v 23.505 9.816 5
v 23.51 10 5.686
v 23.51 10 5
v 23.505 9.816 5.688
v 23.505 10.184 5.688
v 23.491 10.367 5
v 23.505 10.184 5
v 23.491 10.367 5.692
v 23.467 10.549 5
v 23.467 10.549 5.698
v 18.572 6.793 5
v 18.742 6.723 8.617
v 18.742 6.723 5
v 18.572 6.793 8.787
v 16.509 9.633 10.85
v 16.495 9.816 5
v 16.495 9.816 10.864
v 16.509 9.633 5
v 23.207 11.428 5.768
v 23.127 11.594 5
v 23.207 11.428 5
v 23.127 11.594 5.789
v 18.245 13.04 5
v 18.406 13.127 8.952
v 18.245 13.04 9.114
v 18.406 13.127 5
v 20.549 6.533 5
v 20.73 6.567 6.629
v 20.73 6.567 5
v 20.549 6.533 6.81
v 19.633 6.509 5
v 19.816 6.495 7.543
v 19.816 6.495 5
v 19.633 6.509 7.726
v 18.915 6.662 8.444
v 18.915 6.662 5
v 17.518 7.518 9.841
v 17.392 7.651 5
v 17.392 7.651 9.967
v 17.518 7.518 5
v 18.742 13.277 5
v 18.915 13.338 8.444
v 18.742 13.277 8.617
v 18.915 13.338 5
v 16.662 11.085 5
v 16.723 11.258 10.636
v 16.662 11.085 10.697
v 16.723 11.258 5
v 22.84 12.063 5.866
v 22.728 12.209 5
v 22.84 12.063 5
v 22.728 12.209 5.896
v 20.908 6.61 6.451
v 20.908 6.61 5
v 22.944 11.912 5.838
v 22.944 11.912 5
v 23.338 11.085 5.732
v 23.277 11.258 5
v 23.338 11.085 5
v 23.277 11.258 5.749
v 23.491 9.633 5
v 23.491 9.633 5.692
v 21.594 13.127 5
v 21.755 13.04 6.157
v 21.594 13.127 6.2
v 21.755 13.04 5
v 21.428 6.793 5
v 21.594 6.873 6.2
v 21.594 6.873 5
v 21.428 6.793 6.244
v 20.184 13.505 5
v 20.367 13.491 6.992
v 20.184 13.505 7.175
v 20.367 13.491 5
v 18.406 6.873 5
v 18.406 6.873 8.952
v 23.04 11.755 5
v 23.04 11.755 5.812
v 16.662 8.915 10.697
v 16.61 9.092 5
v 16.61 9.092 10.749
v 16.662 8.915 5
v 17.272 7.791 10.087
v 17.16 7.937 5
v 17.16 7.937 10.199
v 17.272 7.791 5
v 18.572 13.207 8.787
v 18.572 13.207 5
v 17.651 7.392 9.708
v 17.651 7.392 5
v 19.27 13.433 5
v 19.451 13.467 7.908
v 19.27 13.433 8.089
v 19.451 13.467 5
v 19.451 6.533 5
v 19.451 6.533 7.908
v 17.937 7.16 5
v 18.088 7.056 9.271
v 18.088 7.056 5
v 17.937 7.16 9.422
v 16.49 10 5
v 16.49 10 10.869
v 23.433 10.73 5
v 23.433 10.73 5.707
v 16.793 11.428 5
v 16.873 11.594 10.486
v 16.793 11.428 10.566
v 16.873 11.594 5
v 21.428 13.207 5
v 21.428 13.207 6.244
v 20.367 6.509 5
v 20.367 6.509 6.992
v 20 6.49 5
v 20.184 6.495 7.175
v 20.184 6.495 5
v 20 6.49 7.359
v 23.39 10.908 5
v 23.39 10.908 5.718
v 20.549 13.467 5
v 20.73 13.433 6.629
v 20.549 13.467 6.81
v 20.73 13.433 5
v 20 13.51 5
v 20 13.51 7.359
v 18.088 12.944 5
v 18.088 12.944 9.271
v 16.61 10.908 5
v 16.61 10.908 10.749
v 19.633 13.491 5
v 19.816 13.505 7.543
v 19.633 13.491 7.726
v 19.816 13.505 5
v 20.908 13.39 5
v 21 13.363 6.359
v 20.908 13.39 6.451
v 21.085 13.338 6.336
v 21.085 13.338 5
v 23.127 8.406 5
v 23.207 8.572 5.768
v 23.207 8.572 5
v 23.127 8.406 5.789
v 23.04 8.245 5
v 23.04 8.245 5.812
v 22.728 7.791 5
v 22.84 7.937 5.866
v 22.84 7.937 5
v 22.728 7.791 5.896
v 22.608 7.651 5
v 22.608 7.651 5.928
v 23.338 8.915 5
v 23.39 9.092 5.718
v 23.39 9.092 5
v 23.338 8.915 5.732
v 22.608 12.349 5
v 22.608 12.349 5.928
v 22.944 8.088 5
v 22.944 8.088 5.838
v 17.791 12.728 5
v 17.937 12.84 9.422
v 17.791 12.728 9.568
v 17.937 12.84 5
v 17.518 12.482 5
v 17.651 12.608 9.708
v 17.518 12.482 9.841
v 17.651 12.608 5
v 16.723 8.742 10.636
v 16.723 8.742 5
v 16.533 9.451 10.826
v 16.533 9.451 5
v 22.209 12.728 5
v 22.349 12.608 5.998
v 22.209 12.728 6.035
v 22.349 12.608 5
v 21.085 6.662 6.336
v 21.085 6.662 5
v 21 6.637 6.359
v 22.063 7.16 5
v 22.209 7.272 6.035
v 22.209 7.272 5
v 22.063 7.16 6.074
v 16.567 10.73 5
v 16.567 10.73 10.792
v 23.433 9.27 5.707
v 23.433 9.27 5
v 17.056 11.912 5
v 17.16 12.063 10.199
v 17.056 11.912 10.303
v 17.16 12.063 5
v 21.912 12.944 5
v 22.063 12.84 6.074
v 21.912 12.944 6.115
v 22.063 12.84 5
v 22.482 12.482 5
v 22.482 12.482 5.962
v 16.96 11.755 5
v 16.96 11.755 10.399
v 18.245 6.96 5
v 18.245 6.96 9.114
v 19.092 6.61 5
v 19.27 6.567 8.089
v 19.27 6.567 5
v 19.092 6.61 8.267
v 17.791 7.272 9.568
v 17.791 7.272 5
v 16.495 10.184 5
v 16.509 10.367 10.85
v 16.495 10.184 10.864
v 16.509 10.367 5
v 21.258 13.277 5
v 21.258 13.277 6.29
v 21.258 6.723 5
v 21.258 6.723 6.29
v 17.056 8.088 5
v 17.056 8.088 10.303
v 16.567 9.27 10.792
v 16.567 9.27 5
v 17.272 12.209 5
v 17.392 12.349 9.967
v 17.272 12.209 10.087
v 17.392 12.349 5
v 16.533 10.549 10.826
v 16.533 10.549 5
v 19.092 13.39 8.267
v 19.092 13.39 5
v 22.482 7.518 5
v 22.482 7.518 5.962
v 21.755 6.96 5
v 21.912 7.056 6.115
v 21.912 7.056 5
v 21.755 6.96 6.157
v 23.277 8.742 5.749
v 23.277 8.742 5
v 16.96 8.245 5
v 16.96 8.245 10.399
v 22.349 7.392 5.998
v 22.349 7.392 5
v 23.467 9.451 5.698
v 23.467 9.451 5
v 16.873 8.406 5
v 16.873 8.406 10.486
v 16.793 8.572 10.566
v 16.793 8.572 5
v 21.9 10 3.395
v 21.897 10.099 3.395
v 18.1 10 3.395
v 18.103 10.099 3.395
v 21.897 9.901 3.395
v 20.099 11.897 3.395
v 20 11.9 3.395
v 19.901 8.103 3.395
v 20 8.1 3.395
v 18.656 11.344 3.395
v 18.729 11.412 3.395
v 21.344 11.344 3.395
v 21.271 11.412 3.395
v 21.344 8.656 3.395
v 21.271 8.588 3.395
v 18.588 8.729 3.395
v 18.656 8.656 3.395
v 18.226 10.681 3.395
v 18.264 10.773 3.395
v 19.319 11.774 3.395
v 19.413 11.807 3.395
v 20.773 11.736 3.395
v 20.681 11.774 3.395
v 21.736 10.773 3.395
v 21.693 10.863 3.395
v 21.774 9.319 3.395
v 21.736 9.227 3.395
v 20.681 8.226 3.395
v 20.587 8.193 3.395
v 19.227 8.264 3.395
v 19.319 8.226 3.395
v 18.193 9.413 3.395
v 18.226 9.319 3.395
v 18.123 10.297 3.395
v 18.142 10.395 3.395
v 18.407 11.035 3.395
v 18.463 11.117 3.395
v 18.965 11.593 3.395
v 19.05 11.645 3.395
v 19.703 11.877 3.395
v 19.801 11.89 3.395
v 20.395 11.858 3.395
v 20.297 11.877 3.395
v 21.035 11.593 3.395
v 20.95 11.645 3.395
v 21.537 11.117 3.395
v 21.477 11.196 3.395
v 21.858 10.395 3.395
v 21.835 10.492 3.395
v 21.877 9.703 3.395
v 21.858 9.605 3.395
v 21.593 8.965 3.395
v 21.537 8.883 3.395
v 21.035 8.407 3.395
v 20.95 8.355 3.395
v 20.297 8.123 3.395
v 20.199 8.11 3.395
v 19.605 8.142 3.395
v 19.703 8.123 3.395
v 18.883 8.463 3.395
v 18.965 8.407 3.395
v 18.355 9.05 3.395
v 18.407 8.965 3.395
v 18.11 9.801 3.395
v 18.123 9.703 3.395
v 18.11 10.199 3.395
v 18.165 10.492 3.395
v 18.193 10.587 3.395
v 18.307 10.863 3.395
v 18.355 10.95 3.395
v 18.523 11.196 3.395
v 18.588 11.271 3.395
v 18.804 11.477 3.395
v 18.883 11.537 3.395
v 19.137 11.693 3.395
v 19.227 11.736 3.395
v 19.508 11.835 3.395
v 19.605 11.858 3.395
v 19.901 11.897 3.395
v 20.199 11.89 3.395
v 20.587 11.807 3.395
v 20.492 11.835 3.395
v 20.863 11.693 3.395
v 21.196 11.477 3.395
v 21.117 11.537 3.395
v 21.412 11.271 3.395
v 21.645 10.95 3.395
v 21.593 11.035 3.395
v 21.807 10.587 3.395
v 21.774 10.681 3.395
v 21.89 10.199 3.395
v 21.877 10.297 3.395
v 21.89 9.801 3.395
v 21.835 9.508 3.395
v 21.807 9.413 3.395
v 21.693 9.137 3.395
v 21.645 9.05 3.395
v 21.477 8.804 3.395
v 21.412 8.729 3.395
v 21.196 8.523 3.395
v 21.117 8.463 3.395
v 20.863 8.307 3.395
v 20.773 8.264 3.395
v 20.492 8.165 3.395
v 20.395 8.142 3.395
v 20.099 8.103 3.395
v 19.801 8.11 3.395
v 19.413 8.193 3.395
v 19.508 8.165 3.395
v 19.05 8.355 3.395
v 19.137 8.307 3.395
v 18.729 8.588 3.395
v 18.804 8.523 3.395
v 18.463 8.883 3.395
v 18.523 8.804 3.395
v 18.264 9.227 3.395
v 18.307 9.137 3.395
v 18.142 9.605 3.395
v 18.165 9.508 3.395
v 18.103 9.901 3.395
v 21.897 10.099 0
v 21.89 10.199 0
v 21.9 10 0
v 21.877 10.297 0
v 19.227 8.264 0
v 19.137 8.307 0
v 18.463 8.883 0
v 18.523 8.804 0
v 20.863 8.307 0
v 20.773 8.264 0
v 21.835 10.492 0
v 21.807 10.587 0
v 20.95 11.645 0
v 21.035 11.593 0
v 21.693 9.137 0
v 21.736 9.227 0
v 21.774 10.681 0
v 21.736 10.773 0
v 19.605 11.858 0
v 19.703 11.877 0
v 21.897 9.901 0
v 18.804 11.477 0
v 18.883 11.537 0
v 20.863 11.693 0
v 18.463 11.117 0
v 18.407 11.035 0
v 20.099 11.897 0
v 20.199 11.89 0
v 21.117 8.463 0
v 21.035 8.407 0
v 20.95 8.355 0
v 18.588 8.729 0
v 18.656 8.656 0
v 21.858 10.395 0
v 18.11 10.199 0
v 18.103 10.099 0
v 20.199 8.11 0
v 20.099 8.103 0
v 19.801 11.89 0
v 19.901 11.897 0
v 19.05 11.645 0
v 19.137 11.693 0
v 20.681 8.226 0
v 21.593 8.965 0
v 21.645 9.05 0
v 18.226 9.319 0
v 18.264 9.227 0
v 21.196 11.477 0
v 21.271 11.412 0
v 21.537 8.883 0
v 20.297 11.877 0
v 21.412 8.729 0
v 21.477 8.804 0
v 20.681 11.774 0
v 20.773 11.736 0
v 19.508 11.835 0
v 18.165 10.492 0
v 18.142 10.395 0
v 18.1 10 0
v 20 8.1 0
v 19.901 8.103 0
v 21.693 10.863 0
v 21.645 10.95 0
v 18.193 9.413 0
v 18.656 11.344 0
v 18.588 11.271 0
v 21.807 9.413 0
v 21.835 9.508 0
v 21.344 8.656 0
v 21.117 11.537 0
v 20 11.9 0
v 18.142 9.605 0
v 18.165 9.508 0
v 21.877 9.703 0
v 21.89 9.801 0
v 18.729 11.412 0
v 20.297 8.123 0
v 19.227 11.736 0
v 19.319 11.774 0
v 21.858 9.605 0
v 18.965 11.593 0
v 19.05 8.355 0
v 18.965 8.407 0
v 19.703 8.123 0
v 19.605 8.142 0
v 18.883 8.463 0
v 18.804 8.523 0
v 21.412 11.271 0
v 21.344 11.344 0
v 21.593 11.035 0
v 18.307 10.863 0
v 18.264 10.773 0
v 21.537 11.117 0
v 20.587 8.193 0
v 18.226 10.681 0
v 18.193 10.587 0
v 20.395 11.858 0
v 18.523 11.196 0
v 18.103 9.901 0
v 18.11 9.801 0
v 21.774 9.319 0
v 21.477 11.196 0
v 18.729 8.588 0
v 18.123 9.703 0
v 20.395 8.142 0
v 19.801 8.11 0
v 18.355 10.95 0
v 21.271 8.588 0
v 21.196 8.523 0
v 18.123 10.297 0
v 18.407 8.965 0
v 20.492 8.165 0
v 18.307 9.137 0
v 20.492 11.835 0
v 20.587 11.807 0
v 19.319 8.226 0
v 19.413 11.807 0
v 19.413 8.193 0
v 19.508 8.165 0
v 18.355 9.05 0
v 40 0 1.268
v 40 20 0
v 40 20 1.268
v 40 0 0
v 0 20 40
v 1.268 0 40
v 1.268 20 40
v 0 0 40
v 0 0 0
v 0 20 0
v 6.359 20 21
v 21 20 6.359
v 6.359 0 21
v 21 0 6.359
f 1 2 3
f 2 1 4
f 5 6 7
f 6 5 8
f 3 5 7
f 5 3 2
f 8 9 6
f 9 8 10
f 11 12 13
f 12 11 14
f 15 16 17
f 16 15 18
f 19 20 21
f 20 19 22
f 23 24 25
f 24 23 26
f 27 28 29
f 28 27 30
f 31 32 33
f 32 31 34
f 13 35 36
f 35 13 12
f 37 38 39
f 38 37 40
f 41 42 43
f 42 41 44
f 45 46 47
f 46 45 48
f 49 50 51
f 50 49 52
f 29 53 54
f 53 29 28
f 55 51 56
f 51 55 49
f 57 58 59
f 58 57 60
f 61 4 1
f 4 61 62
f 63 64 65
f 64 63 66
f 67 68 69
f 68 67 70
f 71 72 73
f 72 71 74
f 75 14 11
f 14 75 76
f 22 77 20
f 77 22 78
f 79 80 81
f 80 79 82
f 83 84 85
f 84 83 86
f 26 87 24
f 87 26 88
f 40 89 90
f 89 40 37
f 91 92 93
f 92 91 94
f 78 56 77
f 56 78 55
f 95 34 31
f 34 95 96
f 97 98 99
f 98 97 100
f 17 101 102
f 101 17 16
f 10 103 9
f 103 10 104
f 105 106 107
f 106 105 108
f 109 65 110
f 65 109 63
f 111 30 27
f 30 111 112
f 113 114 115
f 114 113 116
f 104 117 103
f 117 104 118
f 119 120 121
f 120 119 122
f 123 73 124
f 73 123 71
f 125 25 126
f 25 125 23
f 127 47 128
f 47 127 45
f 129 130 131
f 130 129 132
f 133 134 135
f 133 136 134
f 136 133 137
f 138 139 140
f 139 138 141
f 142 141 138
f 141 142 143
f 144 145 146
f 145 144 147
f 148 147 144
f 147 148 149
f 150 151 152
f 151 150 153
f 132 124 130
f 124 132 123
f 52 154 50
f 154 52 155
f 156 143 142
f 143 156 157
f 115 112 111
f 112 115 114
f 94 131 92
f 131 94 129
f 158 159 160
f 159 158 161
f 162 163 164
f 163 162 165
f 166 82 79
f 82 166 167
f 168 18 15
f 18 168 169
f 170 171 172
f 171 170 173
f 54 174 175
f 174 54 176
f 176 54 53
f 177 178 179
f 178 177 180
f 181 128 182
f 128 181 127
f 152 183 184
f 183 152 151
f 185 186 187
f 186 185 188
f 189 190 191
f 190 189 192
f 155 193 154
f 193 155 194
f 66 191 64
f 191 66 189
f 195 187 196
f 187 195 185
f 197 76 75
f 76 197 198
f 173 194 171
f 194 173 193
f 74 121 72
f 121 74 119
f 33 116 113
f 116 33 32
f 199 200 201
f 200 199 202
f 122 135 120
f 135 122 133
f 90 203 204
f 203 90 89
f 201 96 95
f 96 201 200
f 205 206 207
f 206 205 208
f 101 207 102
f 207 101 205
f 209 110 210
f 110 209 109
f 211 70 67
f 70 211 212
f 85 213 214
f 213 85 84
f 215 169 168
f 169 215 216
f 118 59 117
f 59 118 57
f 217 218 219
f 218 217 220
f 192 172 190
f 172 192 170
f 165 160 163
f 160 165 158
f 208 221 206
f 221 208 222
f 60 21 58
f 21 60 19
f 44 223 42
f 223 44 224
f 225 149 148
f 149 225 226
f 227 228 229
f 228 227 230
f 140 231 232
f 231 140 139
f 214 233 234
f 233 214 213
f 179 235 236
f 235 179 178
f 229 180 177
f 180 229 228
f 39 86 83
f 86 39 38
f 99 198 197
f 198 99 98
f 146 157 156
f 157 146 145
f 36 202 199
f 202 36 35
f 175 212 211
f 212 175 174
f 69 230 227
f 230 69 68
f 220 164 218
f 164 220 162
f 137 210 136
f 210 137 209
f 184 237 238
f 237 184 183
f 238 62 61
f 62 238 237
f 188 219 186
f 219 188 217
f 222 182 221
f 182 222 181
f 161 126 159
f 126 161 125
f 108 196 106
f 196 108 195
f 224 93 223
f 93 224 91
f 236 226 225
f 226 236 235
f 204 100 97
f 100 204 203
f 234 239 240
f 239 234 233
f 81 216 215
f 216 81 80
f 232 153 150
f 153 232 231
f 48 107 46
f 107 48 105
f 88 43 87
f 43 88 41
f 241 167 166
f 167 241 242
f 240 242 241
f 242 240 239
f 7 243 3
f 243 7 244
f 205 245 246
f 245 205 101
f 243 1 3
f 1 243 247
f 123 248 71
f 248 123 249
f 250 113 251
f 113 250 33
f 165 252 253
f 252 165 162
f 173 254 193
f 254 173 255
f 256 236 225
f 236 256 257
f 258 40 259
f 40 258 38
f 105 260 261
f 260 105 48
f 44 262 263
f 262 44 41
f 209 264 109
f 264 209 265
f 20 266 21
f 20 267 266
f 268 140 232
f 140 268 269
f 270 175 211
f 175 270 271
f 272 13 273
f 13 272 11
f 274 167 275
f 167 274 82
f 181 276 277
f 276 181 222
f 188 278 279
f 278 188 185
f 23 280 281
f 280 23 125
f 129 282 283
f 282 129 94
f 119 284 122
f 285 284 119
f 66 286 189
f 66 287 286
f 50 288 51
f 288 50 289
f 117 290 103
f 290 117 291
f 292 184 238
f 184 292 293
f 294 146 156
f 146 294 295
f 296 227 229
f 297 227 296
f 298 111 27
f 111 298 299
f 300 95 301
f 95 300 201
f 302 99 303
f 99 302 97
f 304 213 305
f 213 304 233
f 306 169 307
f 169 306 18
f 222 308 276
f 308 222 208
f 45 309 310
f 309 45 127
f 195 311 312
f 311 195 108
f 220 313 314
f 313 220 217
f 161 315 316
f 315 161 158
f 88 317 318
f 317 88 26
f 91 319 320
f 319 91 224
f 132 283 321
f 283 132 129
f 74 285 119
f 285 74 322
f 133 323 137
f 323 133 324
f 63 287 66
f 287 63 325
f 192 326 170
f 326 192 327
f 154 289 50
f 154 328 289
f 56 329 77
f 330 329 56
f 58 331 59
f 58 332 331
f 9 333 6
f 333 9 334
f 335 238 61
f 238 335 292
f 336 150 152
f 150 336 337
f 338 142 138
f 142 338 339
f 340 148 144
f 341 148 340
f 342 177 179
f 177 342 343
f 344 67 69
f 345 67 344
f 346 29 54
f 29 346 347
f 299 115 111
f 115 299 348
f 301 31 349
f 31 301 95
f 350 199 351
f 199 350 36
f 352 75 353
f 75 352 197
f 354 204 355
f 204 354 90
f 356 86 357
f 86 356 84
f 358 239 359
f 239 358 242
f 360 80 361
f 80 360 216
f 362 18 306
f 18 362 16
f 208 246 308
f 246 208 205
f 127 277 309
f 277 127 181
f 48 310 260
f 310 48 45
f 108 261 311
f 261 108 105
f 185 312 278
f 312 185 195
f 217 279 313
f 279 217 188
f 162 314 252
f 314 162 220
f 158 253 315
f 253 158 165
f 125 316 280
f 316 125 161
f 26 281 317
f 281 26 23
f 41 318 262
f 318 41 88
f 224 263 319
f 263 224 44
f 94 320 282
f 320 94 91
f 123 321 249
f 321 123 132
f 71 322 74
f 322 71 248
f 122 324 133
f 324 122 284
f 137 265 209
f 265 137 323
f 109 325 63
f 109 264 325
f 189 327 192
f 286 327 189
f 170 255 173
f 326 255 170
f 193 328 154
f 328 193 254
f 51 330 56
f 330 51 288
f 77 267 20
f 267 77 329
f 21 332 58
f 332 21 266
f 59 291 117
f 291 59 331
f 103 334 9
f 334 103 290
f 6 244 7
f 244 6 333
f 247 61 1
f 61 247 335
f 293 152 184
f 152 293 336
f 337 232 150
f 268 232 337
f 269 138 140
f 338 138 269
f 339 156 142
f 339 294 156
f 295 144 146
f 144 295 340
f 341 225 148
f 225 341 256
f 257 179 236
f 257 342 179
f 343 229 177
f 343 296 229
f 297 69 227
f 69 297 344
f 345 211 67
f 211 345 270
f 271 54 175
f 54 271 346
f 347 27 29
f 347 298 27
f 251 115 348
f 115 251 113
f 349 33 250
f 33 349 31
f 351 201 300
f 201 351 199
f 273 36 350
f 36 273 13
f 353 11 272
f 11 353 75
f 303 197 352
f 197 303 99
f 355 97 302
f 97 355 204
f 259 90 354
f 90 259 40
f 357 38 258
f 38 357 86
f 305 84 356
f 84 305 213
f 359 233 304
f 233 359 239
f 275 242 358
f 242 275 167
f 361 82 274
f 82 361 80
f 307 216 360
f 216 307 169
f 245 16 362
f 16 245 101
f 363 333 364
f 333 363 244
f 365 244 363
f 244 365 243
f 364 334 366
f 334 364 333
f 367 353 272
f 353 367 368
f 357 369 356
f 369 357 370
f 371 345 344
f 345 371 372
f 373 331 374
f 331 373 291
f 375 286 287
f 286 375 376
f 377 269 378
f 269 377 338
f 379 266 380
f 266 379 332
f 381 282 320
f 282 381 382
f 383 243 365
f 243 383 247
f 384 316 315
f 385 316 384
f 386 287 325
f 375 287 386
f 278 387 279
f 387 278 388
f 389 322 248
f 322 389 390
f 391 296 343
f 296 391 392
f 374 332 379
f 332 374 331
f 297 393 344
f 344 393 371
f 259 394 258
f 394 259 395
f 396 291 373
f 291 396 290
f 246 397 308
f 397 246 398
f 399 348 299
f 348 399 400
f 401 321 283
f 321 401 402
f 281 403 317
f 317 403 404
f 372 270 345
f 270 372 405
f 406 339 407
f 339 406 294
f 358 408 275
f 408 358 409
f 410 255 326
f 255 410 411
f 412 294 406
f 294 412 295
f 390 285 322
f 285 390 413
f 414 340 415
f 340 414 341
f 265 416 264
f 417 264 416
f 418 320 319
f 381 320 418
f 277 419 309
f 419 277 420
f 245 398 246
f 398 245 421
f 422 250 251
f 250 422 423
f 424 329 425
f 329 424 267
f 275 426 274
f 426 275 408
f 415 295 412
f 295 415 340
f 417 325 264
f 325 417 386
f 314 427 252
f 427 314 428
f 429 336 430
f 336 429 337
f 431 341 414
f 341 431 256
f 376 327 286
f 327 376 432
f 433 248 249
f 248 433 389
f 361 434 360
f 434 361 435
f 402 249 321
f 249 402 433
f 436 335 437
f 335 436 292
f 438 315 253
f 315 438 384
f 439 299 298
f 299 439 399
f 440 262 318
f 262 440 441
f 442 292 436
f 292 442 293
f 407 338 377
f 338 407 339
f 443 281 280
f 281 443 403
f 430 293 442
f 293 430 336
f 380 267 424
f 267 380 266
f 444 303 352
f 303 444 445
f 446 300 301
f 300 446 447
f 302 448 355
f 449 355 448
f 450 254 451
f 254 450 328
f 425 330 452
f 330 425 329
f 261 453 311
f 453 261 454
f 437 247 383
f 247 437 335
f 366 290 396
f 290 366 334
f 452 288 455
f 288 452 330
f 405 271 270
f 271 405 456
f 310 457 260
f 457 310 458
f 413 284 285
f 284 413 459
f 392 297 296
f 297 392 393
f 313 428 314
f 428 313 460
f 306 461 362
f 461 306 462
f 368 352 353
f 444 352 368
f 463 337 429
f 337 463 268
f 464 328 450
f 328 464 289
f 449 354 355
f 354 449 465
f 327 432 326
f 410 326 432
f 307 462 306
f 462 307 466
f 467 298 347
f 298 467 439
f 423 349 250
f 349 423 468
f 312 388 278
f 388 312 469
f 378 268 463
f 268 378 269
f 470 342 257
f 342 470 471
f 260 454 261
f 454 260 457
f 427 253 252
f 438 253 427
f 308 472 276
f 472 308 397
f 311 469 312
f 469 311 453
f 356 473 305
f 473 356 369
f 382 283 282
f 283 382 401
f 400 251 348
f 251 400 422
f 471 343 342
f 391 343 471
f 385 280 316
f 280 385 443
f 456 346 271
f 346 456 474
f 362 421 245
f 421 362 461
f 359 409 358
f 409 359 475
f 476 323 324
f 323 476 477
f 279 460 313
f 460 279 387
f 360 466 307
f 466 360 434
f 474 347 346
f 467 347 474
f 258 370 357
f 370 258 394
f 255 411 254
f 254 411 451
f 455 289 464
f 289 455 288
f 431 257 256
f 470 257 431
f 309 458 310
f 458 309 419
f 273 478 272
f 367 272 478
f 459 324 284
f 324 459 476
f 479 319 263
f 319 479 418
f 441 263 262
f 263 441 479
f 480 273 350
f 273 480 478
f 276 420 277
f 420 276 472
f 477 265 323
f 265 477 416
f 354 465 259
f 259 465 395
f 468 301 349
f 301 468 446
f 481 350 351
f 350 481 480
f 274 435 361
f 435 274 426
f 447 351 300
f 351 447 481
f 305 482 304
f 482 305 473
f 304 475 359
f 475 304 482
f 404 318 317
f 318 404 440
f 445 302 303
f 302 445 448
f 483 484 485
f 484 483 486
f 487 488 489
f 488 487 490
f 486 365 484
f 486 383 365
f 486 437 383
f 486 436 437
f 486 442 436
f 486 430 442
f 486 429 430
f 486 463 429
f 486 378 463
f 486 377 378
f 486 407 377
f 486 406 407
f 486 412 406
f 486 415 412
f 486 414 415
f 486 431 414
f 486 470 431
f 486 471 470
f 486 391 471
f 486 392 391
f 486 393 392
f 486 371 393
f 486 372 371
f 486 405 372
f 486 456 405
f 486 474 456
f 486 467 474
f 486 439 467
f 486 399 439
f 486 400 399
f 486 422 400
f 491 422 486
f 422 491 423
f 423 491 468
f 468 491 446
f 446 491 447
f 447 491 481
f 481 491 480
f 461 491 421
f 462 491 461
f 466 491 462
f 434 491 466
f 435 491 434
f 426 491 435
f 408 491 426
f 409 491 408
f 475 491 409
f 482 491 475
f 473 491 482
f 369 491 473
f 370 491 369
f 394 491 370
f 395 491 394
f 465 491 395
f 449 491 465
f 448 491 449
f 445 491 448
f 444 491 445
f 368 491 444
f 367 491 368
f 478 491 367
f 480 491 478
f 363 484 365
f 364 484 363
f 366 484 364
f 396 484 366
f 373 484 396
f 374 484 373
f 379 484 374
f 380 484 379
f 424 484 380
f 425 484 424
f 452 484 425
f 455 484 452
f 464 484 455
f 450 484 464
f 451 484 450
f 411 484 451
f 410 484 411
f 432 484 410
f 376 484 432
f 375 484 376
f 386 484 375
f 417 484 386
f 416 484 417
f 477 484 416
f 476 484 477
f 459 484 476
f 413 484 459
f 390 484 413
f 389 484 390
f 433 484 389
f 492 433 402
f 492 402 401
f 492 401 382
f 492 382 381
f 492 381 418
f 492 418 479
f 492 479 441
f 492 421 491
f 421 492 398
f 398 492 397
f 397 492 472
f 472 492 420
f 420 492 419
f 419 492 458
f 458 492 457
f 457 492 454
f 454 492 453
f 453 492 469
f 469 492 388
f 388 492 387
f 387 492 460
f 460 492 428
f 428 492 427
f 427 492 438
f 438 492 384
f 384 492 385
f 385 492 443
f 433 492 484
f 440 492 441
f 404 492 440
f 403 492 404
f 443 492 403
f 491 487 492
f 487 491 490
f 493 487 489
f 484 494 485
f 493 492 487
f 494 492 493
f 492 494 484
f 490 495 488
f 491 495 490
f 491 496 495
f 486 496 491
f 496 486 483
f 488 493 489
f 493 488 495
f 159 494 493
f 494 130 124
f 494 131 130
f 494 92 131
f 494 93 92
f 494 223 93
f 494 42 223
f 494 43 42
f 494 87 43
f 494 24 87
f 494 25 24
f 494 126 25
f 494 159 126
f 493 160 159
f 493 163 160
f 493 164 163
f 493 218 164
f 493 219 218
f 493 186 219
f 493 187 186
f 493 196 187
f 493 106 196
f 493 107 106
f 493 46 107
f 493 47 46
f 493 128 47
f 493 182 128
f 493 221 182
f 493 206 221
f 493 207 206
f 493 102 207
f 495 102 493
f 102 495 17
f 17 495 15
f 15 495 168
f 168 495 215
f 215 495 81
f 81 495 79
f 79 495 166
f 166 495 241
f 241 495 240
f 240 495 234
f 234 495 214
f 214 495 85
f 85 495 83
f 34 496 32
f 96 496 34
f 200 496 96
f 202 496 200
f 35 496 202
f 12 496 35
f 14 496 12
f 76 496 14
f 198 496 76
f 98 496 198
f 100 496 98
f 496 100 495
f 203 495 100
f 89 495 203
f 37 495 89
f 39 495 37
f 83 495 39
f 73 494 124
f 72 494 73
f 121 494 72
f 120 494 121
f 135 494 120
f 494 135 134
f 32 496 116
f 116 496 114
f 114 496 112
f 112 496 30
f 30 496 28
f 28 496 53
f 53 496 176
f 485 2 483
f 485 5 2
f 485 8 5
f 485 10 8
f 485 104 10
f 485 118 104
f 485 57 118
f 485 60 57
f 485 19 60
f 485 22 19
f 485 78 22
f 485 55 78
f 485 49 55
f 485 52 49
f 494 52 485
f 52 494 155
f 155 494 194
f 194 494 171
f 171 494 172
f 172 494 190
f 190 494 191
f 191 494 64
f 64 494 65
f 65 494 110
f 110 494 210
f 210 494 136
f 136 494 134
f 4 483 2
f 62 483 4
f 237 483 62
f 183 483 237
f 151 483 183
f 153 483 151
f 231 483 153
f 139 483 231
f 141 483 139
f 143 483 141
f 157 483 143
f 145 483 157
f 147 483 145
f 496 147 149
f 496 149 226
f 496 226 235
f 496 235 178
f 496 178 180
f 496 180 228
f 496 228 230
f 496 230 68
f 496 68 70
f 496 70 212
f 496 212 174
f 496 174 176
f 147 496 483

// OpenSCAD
// Shelf bracket with 2 screws
// Adapt to size
//by Martin Korinek
// Oct. 2020

$fn = 12;
bracket_size = 40;
bracket_width = 20;
bracket_thickness = 1; //measured from a circle e.g. $fn = 120

difference()
{
    cube([bracket_size,bracket_width,bracket_size]);
    translate([bracket_size+bracket_thickness,0,bracket_size+bracket_thickness]) 
        rotate([-90,0,0]) 
            cylinder(h=bracket_width,r=bracket_size);
    //screw hole #1
    translate([bracket_size/2,bracket_width/2,2]) screw_hole();
}



module screw_hole()
{   
    $fn =120; 
    screw_diameter = 3.8;
    head_diameter = 7;
    
    translate([0,0,head_diameter/2-0.5])
        cylinder(h=100, d1=head_diameter+0.02, d2=head_diameter+0.02);
    translate([0,0,-0.5])cylinder(h=head_diameter/2, d1=0, d2=head_diameter+0.02);
    translate([0,0,-18])cylinder(h=20, d=screw_diameter);
}
